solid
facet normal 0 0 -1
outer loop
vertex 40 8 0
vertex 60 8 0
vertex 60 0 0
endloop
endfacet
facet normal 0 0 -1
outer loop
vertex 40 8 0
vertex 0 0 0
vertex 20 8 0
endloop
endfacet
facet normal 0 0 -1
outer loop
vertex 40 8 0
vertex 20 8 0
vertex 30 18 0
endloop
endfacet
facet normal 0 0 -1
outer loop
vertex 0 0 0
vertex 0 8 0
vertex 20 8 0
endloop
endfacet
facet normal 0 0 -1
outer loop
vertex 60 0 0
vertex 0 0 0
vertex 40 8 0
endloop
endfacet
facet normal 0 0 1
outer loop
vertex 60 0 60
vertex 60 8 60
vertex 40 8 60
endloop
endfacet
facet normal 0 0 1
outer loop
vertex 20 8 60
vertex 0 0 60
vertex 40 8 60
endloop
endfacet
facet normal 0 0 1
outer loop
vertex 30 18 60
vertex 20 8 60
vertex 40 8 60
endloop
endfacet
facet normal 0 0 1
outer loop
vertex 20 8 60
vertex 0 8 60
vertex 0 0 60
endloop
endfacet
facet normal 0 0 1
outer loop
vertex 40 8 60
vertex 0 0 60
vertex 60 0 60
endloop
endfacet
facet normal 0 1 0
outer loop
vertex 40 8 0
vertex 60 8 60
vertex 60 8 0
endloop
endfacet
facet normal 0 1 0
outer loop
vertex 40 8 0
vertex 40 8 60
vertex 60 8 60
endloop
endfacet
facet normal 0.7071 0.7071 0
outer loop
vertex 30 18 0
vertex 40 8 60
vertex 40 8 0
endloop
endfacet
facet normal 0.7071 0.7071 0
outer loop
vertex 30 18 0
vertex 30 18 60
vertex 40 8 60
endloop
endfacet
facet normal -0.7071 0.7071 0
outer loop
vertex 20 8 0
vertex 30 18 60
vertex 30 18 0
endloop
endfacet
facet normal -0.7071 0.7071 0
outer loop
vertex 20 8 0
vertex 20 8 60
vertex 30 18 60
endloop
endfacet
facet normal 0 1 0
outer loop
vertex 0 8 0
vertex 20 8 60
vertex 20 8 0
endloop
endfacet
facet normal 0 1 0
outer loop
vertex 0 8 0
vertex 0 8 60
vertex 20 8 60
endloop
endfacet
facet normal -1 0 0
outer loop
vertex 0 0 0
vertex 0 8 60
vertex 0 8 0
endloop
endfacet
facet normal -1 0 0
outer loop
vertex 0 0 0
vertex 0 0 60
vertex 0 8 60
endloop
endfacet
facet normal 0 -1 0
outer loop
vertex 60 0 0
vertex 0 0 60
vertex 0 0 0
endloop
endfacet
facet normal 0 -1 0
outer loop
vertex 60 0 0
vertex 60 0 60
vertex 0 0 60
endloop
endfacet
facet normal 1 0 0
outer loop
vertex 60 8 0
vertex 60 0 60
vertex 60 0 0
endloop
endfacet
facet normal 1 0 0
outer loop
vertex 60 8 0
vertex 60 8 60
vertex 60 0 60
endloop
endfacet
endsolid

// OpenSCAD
$fn = 32;

// ----------------------------------------------------------------------
// V guide rail: vrib, 60 mm wide
// ----------------------------------------------------------------------

// --- parameters (mm) ---
rail_w = 60;              // rail width, X
base_t = 8;               // base plate thickness
v_depth = 10;             // V feature depth / height
v_half_w = 10;            // half width of the V at the base face
plate_t = 60;             // rail length, Z (the extrusion height)

profile = [[0, 0], [60, 0], [60, 8], [40, 8], [30, 18], [20, 8], [0, 8]];  // primary outline, 7 points, counter clockwise

// --- the one profile operation ---
linear_extrude(height = plate_t) polygon(points = profile);
